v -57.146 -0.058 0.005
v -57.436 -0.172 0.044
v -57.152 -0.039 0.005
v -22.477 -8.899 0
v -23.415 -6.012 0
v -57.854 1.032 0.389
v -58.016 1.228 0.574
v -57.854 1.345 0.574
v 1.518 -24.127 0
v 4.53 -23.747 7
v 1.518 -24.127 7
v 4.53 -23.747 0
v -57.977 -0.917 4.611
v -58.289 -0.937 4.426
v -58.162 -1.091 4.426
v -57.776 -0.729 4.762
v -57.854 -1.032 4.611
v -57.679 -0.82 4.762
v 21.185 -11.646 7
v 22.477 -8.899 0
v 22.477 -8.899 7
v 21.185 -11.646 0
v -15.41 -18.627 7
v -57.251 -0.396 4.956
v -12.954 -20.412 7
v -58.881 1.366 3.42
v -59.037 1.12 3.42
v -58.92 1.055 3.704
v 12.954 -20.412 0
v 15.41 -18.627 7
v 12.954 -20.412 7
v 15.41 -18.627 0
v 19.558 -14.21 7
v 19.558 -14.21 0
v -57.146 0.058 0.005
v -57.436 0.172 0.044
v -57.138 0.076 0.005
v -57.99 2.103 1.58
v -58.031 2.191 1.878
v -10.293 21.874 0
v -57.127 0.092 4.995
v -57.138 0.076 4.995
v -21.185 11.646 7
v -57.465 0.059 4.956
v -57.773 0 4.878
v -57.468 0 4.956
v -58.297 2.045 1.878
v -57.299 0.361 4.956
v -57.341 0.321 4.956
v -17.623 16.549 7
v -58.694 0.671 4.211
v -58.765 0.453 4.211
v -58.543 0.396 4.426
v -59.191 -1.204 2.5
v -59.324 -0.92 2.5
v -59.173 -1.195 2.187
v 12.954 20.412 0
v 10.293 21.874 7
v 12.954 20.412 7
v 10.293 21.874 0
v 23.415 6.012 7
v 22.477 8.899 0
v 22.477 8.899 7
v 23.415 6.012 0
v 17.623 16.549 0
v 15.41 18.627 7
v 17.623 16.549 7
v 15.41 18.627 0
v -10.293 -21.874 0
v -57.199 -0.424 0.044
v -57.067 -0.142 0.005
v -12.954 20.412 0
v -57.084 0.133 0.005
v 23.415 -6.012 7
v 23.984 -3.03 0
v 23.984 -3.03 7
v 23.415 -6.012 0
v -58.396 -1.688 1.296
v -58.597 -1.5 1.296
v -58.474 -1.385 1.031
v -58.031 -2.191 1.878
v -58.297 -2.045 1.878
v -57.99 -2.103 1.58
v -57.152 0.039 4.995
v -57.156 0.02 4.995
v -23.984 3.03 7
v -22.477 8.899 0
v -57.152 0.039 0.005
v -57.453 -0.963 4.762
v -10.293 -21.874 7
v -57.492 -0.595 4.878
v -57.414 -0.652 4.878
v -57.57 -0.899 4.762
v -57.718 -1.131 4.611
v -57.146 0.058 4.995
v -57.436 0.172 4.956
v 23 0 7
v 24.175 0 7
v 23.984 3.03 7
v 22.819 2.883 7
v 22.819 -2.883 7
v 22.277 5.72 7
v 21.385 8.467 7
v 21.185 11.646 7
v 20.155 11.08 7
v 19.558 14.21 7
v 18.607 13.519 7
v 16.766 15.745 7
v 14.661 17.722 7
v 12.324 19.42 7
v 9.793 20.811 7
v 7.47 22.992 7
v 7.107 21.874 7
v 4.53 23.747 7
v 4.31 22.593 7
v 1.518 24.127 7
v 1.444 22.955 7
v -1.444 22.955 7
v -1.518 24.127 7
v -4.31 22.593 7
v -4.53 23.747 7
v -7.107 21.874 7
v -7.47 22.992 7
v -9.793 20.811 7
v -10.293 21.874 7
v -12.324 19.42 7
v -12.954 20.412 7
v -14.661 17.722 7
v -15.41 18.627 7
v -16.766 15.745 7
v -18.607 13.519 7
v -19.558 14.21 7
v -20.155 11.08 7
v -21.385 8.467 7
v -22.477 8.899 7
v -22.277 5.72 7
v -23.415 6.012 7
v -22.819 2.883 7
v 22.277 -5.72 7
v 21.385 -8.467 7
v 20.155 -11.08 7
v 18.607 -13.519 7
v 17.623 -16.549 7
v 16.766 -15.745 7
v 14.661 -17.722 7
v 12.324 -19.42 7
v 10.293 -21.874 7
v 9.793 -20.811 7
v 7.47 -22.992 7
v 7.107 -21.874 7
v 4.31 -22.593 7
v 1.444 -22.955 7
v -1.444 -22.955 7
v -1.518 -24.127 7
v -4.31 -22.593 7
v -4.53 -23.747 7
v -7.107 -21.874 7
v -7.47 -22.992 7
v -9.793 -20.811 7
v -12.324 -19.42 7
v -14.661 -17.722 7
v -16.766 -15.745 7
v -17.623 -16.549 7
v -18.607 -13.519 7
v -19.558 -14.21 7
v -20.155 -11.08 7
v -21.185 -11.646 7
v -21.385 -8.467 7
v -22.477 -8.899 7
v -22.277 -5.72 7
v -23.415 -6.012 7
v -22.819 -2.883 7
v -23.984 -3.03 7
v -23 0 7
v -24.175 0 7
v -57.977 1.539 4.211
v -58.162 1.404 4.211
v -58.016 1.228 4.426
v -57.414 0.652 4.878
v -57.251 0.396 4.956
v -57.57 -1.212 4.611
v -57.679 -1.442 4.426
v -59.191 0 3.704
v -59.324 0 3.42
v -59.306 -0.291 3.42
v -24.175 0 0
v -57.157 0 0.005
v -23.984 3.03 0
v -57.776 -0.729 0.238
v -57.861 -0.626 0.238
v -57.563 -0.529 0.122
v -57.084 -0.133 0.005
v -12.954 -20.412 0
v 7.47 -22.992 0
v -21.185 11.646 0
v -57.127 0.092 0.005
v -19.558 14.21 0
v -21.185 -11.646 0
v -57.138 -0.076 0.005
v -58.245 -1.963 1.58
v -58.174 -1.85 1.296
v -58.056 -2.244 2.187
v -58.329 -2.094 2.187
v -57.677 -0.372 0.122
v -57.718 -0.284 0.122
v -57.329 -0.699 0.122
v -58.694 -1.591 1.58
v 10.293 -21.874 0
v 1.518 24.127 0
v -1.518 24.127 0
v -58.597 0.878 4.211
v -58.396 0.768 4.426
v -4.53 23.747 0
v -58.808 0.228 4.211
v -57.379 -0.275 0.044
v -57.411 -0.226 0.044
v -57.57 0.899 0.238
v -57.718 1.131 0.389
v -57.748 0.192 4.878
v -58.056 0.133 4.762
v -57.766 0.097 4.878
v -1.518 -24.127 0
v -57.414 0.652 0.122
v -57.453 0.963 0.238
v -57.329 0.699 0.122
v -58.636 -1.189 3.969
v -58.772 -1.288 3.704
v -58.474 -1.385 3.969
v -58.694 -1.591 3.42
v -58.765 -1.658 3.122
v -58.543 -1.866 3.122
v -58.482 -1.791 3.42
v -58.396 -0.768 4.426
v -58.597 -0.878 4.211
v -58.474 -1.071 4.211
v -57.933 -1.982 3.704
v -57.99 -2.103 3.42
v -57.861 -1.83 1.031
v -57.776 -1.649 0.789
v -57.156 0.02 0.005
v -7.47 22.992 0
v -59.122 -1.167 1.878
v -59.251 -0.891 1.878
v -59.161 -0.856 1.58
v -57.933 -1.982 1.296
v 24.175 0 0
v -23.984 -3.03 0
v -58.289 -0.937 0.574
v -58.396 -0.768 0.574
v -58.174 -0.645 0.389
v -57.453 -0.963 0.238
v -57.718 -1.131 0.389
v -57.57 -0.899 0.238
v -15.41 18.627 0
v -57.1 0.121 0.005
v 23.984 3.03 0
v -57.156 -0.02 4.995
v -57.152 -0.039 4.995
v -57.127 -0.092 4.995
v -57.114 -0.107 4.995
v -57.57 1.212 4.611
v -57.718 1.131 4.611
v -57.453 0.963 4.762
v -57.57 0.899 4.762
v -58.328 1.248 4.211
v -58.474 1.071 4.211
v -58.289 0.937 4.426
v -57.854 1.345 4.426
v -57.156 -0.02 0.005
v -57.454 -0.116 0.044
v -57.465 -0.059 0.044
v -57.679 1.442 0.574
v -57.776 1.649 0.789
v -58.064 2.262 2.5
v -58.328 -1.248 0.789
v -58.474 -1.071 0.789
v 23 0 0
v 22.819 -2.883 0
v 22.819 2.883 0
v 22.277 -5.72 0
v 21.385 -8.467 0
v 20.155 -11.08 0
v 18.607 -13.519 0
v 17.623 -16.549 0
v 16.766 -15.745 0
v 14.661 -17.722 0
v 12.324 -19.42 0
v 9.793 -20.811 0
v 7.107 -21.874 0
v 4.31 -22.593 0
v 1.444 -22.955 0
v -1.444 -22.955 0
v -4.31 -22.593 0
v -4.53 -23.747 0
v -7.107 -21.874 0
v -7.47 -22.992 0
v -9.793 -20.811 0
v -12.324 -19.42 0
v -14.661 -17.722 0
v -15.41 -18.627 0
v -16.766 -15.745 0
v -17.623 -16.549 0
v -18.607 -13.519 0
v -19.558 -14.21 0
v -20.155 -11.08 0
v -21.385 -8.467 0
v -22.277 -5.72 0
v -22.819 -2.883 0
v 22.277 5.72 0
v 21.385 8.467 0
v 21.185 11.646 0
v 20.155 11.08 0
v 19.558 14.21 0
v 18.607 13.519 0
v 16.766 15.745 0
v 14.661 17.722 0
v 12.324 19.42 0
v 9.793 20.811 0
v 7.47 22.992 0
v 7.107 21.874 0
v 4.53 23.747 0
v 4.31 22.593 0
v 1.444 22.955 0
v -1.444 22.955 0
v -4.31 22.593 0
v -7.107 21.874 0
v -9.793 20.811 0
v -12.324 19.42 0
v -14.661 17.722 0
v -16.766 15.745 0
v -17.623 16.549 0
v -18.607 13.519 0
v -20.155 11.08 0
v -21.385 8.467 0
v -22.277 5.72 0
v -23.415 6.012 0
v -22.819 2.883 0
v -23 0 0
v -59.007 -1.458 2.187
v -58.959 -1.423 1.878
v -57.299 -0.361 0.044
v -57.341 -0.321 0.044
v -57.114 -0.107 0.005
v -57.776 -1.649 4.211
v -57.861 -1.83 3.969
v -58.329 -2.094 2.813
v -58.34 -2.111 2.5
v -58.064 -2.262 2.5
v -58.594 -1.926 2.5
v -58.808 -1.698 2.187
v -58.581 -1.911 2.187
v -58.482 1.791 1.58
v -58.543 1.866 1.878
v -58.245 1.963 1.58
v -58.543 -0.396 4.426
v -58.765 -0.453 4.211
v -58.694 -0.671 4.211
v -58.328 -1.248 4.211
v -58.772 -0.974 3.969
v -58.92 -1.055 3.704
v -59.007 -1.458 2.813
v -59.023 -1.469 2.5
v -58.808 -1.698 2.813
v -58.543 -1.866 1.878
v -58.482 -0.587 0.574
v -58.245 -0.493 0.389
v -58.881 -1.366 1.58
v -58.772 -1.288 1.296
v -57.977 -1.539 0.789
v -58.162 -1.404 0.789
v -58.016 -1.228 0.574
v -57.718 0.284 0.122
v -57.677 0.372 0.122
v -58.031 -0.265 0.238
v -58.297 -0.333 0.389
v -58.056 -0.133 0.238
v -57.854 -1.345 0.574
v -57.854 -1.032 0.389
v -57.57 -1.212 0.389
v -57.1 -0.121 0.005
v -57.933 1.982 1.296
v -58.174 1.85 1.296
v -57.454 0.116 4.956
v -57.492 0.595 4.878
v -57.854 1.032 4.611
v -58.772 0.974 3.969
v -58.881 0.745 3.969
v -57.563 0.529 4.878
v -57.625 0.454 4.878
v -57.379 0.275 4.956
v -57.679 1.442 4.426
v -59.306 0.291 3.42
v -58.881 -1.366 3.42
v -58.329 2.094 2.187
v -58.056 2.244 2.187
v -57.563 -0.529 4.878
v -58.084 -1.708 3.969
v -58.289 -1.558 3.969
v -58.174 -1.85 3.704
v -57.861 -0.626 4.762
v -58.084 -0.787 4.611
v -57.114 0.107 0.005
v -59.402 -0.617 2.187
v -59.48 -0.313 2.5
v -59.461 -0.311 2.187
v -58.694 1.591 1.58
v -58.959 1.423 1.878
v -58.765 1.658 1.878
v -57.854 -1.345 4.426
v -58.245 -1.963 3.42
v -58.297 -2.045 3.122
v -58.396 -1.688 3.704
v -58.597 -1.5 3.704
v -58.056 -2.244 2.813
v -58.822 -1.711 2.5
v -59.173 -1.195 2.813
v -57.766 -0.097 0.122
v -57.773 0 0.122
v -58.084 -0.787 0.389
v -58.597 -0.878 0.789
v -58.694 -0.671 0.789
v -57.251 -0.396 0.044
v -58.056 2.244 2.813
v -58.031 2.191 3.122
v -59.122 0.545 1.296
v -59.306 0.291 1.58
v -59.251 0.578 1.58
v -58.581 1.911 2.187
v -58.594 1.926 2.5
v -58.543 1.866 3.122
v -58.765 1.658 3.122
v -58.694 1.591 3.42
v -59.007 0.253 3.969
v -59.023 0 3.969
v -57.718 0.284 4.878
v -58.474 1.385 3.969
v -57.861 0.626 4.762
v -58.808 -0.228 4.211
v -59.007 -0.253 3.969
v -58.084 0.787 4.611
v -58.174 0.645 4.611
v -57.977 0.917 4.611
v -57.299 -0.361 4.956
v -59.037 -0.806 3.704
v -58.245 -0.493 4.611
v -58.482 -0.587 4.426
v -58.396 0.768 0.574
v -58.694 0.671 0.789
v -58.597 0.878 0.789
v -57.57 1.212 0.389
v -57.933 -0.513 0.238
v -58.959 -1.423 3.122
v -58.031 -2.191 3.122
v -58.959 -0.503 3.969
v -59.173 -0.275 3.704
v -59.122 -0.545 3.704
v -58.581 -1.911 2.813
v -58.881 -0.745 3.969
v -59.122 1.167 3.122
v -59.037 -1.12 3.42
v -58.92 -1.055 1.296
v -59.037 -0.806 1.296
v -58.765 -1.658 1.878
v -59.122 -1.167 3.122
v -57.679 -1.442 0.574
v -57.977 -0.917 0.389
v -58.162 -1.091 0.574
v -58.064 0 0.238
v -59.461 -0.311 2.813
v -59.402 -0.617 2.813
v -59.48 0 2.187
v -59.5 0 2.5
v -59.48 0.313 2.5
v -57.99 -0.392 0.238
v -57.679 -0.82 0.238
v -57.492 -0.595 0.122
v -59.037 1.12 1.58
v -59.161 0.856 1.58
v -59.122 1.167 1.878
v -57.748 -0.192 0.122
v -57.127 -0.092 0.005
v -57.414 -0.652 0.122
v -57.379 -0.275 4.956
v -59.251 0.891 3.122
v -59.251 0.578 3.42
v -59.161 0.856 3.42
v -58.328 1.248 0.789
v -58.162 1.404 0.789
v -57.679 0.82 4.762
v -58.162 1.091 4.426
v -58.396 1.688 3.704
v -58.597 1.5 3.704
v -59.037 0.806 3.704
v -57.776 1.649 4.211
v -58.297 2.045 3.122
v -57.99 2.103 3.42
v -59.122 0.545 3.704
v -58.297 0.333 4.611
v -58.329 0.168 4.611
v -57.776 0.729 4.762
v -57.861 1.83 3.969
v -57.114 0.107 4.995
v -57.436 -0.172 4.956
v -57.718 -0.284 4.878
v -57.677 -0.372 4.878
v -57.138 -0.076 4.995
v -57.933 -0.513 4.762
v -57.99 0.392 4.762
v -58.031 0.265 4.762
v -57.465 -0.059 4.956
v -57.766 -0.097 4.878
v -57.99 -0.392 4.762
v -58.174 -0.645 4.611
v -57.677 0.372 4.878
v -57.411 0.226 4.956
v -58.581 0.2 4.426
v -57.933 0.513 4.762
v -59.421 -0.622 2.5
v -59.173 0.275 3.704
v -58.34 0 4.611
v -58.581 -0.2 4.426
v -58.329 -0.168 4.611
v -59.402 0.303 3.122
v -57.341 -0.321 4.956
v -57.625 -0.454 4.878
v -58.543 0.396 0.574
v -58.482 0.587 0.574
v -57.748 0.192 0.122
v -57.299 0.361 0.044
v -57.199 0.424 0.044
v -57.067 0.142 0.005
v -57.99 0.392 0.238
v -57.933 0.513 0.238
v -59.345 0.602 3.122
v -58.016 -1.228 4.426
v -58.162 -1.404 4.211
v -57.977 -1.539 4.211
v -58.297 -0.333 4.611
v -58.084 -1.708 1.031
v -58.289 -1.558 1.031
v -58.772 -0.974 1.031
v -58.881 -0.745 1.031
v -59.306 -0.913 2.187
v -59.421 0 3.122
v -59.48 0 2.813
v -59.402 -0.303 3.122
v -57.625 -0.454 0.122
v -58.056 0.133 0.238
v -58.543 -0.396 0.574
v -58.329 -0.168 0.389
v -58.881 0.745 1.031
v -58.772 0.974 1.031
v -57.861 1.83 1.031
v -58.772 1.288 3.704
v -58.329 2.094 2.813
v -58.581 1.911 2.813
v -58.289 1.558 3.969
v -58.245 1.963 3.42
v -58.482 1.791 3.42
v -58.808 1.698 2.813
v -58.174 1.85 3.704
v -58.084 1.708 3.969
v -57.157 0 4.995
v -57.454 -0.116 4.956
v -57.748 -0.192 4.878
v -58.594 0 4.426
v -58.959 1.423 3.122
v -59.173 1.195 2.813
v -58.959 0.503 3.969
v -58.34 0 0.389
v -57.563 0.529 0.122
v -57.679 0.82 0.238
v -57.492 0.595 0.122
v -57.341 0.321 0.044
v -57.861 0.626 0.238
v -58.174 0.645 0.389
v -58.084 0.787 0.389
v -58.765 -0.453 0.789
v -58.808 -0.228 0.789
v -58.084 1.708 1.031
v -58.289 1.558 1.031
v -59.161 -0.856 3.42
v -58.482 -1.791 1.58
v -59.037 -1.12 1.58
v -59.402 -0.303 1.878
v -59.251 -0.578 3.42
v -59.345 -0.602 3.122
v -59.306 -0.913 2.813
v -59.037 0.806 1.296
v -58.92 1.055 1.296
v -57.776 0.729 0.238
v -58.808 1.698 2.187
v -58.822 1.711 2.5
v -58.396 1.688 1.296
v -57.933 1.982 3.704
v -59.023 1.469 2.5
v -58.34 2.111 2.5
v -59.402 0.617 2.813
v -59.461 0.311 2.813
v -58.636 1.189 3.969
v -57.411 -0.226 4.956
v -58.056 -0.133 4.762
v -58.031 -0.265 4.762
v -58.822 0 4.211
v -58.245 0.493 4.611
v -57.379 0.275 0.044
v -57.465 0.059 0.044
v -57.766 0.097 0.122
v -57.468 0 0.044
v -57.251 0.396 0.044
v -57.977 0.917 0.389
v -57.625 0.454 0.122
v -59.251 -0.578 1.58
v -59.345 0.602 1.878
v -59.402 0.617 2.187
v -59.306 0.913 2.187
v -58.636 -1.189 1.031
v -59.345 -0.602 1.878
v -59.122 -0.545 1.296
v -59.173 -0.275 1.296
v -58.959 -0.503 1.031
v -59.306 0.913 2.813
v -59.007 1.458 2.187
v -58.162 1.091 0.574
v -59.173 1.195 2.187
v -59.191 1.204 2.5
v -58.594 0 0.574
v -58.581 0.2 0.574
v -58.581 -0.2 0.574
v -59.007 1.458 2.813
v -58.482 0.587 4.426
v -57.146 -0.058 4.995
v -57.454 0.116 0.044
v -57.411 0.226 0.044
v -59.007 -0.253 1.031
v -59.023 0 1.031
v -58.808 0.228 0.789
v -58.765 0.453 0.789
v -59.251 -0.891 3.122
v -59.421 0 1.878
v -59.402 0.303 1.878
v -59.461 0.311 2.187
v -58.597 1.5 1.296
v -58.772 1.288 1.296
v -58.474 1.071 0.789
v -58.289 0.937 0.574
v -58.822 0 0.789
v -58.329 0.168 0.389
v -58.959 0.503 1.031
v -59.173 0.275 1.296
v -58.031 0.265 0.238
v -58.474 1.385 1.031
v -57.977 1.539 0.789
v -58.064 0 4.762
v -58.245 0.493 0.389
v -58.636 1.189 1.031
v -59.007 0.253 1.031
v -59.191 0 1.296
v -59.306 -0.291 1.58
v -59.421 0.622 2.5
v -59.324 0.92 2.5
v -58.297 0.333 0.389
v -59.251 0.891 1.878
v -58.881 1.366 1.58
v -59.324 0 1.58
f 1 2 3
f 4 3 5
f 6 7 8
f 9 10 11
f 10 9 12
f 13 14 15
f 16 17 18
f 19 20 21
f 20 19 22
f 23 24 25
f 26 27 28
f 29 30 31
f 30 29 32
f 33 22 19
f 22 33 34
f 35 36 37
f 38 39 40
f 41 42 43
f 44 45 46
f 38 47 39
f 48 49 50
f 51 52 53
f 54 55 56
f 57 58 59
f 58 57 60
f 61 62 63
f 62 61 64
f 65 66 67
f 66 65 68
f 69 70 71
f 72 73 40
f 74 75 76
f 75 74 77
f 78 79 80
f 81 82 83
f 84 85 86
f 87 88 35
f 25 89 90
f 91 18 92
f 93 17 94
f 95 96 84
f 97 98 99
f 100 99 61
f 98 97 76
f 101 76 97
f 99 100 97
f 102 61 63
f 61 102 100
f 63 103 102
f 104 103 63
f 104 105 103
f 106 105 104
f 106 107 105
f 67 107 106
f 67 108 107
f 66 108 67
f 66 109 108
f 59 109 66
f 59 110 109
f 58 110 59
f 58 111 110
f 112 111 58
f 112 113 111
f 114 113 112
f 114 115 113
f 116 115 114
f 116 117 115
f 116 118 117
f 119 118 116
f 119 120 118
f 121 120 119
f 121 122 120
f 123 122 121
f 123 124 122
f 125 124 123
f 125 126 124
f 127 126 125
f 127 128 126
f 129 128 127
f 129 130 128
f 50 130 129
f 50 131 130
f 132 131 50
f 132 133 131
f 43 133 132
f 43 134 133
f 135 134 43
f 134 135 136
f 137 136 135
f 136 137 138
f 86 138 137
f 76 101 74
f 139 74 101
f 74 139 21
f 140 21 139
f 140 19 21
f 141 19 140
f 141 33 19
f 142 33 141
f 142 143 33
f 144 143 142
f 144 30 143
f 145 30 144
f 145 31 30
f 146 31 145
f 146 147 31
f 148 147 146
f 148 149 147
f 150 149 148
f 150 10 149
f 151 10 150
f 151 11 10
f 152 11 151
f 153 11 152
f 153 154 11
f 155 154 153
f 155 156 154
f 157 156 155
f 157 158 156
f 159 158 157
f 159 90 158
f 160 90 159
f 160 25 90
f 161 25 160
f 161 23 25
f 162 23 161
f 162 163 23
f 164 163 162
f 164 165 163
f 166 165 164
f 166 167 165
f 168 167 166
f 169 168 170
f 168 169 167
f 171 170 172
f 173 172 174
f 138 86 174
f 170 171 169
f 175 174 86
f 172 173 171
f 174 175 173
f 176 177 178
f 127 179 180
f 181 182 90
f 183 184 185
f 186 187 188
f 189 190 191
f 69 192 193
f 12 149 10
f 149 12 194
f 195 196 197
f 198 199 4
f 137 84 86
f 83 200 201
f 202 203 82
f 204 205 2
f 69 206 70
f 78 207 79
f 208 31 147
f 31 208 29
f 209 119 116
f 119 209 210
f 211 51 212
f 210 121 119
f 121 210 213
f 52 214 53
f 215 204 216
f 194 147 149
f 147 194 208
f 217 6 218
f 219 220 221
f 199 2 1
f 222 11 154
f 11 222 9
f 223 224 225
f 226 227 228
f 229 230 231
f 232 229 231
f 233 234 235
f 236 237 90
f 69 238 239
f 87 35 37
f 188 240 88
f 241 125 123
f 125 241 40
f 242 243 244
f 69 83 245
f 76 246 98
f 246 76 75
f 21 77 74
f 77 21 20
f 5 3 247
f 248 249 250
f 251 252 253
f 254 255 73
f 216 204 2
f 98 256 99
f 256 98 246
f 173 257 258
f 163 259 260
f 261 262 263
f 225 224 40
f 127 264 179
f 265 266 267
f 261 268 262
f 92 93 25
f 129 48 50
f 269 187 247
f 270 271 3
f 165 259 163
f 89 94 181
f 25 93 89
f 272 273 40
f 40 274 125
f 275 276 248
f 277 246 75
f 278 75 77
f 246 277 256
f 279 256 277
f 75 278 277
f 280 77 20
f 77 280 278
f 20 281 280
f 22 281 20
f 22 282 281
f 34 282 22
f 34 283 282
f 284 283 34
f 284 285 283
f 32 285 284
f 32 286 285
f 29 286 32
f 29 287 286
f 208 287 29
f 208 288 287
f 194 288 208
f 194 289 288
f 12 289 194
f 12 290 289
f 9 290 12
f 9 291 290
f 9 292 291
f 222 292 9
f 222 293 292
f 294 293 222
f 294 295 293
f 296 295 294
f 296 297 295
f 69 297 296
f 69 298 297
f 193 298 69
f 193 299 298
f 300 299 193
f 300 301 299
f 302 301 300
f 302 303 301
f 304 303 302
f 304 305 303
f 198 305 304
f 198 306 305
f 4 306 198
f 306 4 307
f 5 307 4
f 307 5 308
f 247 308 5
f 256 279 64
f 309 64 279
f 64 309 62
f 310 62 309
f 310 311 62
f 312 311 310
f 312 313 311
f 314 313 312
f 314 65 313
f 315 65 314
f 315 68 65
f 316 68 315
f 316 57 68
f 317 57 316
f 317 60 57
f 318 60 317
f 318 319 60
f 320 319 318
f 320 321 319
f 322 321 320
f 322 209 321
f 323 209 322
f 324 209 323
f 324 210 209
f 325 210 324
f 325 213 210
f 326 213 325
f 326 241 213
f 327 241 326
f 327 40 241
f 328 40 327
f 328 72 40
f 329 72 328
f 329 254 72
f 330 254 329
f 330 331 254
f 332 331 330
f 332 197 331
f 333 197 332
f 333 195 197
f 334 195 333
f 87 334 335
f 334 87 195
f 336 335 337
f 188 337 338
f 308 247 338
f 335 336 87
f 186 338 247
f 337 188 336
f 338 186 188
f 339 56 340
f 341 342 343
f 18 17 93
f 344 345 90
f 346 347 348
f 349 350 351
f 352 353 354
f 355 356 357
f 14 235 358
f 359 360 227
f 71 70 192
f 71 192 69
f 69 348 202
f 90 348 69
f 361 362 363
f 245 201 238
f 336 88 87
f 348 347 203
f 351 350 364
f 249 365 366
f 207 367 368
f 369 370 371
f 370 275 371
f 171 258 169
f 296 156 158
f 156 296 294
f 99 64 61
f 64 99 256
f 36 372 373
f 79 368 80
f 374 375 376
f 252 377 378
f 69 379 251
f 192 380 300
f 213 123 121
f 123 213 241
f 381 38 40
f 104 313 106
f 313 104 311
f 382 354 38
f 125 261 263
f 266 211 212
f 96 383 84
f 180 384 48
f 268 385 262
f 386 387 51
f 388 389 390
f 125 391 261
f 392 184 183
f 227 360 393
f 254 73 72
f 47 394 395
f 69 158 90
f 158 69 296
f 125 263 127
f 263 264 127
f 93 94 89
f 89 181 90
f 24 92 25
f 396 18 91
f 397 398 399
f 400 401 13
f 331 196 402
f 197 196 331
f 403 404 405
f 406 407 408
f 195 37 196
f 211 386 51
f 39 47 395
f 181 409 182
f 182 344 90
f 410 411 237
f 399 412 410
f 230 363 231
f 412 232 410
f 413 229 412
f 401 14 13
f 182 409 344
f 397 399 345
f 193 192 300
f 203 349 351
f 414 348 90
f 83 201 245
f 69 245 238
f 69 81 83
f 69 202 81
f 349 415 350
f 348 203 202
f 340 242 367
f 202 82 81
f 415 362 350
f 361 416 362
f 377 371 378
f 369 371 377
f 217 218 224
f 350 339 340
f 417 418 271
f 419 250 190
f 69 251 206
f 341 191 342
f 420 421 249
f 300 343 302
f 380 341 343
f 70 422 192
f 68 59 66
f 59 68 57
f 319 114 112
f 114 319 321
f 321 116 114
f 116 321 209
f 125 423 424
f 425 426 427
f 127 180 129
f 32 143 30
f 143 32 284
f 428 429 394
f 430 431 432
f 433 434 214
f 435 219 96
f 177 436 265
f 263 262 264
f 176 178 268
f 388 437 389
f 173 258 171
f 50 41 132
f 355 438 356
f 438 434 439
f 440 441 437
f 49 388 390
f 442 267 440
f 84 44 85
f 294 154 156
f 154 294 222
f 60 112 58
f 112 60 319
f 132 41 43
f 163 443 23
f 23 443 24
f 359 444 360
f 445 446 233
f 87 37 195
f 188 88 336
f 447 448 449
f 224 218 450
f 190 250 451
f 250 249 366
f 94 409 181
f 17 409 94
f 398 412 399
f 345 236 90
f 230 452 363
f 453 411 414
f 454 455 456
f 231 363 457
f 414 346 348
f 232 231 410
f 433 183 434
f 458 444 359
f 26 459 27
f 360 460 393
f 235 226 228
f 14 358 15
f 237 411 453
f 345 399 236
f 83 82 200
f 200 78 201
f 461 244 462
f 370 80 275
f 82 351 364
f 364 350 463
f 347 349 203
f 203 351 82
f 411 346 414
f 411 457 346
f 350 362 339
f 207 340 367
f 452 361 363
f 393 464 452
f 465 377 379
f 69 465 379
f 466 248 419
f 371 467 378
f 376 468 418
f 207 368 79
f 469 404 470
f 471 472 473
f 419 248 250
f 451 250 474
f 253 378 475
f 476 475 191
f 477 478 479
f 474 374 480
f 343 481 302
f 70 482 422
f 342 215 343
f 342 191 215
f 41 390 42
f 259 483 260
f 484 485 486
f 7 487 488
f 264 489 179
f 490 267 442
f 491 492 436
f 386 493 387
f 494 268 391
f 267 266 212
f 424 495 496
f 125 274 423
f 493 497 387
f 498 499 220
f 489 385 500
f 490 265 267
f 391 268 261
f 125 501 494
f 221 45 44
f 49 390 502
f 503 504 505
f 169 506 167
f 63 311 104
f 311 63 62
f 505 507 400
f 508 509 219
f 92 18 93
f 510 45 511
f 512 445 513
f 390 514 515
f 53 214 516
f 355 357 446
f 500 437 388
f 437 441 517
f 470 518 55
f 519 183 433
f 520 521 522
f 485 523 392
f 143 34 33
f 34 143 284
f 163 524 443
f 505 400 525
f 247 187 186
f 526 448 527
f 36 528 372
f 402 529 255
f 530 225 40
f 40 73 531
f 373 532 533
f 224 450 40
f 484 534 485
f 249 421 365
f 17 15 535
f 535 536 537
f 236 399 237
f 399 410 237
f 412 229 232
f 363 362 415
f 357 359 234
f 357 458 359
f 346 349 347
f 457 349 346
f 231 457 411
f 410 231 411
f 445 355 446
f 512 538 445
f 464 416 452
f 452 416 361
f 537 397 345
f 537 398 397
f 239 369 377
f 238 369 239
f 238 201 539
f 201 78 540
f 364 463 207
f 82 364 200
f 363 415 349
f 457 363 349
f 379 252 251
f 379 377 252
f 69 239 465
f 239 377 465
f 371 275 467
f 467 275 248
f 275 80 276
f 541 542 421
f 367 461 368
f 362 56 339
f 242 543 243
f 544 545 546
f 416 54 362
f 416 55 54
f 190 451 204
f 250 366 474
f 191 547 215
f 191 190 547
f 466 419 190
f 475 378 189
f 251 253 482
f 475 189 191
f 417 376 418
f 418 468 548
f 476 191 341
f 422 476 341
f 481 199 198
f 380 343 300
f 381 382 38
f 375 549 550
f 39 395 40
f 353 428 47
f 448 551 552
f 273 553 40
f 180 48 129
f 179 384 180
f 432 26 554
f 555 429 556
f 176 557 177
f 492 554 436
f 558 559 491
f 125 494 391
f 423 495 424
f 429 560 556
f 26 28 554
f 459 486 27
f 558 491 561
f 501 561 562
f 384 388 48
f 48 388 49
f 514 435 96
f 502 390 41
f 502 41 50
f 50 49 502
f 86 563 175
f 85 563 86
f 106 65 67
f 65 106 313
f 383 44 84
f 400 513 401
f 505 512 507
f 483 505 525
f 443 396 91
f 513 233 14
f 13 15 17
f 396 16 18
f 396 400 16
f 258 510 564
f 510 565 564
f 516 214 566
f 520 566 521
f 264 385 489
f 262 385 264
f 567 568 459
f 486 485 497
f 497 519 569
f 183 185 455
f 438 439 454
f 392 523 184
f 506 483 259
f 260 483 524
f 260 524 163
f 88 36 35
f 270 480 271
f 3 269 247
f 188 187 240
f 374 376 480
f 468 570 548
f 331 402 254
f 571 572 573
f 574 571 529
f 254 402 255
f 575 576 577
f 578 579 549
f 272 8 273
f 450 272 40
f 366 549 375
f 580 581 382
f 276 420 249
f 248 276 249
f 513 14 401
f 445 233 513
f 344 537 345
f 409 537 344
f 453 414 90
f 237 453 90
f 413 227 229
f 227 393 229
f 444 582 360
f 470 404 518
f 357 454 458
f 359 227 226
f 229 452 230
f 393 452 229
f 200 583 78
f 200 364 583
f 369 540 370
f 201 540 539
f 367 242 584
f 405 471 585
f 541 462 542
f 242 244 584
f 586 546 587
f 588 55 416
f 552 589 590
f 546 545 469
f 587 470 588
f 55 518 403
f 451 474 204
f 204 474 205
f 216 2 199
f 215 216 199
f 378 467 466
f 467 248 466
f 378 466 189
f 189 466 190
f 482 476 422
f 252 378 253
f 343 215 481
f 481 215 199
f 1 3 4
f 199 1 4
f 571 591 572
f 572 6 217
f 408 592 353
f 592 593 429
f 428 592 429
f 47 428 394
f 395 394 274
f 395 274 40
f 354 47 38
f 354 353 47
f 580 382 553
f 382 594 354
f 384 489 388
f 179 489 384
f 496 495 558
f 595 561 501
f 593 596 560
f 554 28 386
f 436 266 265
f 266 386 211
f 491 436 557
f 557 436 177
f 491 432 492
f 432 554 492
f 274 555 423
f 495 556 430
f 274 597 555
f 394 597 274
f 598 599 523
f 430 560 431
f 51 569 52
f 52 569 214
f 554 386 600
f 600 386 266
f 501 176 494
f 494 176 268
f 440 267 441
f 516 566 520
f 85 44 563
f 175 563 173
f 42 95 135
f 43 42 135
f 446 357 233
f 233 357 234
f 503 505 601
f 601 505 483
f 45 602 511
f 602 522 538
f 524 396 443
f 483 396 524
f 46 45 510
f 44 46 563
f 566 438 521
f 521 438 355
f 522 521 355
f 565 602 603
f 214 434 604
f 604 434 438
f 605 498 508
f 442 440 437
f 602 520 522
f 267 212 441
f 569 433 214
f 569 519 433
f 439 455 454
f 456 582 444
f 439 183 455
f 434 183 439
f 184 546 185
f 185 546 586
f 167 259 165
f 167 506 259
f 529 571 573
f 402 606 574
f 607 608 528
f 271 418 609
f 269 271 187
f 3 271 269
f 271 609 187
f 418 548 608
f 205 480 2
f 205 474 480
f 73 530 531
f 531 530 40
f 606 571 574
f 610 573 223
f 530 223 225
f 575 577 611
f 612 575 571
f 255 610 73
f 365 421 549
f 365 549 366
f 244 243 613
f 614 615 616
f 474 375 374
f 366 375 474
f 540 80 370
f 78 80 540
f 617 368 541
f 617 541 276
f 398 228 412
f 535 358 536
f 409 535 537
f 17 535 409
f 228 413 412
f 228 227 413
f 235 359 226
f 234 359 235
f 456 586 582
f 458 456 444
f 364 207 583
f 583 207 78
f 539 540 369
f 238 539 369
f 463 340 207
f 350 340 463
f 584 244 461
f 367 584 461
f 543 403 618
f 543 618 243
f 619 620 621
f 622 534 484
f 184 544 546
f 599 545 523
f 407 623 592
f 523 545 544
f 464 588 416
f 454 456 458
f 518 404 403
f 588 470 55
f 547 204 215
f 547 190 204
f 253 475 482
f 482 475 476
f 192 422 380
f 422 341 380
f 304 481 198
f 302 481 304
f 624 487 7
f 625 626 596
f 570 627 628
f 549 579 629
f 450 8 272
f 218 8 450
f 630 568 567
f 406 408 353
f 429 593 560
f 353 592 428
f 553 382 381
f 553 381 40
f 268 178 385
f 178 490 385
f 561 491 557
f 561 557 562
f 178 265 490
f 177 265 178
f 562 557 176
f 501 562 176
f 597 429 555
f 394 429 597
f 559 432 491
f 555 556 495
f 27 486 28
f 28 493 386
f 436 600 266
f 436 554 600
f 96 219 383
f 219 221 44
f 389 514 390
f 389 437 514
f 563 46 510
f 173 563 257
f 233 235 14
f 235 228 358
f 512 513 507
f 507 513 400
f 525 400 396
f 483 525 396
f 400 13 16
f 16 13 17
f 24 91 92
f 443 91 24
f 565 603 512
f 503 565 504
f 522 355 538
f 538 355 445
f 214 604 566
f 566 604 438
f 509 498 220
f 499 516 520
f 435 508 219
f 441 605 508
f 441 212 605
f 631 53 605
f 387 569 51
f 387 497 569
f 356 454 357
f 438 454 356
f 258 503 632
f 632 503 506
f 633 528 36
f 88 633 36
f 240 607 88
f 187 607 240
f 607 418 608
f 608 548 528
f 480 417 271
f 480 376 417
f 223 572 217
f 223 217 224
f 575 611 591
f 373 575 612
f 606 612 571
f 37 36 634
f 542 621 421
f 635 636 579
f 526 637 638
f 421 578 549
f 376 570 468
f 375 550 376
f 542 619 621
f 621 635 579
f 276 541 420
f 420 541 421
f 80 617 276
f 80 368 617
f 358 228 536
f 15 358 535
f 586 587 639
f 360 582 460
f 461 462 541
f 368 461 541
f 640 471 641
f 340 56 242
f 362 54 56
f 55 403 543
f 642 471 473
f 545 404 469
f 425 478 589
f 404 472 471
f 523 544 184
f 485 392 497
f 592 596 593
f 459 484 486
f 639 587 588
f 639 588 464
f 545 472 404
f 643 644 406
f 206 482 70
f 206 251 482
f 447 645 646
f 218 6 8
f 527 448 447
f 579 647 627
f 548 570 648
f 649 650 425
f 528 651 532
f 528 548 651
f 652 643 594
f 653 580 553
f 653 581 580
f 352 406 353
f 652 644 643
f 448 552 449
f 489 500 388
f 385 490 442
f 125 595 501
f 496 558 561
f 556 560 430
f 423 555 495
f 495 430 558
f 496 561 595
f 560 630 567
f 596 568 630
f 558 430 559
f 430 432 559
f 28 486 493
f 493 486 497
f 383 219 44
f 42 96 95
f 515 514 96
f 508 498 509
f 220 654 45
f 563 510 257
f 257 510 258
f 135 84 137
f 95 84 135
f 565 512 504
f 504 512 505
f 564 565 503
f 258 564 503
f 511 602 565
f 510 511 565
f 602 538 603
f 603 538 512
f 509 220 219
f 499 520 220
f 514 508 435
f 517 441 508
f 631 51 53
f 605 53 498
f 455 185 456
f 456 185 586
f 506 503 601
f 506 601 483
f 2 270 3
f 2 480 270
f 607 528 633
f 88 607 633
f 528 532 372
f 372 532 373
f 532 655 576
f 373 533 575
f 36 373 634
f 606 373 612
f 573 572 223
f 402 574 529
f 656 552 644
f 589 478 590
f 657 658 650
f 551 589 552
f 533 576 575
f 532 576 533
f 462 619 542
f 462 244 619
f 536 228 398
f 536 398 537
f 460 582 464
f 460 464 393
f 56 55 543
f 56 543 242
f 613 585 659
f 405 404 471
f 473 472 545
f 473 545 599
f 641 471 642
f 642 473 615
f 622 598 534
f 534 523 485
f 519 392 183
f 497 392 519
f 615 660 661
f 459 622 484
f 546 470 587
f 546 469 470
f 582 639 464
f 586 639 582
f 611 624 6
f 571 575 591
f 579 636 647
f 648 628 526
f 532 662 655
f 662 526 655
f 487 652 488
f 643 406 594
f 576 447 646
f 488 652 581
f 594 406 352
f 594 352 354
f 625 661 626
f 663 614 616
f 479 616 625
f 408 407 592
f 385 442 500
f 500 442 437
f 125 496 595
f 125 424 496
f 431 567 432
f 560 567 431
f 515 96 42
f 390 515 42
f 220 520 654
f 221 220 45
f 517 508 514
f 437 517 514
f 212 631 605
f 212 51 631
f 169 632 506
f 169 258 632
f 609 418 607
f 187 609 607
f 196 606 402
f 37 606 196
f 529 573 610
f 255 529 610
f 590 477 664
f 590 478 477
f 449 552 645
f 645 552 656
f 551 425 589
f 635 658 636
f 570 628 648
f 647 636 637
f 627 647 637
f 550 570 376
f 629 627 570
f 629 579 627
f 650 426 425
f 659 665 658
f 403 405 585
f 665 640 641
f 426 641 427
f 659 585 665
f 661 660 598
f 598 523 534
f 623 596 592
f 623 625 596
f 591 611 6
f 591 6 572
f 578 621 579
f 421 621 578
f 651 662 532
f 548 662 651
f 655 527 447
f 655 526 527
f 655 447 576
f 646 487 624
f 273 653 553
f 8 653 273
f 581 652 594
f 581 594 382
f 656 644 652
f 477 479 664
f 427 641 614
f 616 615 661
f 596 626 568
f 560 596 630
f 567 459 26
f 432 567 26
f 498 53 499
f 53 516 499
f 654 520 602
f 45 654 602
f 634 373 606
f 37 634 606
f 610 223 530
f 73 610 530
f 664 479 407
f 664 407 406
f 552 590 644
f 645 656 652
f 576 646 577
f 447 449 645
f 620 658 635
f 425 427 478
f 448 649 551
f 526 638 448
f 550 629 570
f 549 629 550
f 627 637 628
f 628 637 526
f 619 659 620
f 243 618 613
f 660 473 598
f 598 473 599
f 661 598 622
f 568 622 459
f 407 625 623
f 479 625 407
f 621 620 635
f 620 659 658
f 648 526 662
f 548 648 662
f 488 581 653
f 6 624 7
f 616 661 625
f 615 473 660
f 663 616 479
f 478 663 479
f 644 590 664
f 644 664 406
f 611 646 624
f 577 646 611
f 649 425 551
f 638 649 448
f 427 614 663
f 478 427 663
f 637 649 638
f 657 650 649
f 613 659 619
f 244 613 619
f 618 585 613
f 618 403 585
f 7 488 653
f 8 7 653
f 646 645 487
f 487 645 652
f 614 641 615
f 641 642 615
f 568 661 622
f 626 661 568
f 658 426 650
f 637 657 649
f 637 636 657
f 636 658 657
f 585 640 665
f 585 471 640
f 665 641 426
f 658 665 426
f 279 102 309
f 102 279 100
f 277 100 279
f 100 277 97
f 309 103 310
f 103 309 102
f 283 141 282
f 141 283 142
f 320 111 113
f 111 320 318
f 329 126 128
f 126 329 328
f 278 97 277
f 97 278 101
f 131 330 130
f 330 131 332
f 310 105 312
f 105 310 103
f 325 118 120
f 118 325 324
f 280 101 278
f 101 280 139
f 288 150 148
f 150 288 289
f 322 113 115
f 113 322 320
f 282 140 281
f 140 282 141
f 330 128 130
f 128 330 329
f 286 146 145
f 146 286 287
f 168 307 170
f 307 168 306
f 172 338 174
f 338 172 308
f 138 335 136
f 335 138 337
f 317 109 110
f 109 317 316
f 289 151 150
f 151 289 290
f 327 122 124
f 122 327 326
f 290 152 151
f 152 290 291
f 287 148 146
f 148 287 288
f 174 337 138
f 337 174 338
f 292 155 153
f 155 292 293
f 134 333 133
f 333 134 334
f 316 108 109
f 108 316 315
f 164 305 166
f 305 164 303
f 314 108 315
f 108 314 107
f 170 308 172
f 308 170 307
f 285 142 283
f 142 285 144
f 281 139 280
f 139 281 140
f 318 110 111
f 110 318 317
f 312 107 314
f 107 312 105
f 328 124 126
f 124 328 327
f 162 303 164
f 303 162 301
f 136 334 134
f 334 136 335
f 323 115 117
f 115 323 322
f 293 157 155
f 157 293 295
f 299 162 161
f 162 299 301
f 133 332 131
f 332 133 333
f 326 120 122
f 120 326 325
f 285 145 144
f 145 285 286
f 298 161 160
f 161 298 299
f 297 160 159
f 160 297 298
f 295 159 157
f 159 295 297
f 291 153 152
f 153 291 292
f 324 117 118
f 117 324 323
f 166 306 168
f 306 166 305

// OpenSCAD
$fn=50;

difference()
{
	hull()
	{
		cylinder(h=7, d=48 + 0.35);
		translate([-57,0,2.5]) sphere(d=5);
	}
	cylinder(h=7, d=46);
	translate([0,0,-0.01]) cylinder(h=7 + 0.02, d=44 + 0.35);
}
